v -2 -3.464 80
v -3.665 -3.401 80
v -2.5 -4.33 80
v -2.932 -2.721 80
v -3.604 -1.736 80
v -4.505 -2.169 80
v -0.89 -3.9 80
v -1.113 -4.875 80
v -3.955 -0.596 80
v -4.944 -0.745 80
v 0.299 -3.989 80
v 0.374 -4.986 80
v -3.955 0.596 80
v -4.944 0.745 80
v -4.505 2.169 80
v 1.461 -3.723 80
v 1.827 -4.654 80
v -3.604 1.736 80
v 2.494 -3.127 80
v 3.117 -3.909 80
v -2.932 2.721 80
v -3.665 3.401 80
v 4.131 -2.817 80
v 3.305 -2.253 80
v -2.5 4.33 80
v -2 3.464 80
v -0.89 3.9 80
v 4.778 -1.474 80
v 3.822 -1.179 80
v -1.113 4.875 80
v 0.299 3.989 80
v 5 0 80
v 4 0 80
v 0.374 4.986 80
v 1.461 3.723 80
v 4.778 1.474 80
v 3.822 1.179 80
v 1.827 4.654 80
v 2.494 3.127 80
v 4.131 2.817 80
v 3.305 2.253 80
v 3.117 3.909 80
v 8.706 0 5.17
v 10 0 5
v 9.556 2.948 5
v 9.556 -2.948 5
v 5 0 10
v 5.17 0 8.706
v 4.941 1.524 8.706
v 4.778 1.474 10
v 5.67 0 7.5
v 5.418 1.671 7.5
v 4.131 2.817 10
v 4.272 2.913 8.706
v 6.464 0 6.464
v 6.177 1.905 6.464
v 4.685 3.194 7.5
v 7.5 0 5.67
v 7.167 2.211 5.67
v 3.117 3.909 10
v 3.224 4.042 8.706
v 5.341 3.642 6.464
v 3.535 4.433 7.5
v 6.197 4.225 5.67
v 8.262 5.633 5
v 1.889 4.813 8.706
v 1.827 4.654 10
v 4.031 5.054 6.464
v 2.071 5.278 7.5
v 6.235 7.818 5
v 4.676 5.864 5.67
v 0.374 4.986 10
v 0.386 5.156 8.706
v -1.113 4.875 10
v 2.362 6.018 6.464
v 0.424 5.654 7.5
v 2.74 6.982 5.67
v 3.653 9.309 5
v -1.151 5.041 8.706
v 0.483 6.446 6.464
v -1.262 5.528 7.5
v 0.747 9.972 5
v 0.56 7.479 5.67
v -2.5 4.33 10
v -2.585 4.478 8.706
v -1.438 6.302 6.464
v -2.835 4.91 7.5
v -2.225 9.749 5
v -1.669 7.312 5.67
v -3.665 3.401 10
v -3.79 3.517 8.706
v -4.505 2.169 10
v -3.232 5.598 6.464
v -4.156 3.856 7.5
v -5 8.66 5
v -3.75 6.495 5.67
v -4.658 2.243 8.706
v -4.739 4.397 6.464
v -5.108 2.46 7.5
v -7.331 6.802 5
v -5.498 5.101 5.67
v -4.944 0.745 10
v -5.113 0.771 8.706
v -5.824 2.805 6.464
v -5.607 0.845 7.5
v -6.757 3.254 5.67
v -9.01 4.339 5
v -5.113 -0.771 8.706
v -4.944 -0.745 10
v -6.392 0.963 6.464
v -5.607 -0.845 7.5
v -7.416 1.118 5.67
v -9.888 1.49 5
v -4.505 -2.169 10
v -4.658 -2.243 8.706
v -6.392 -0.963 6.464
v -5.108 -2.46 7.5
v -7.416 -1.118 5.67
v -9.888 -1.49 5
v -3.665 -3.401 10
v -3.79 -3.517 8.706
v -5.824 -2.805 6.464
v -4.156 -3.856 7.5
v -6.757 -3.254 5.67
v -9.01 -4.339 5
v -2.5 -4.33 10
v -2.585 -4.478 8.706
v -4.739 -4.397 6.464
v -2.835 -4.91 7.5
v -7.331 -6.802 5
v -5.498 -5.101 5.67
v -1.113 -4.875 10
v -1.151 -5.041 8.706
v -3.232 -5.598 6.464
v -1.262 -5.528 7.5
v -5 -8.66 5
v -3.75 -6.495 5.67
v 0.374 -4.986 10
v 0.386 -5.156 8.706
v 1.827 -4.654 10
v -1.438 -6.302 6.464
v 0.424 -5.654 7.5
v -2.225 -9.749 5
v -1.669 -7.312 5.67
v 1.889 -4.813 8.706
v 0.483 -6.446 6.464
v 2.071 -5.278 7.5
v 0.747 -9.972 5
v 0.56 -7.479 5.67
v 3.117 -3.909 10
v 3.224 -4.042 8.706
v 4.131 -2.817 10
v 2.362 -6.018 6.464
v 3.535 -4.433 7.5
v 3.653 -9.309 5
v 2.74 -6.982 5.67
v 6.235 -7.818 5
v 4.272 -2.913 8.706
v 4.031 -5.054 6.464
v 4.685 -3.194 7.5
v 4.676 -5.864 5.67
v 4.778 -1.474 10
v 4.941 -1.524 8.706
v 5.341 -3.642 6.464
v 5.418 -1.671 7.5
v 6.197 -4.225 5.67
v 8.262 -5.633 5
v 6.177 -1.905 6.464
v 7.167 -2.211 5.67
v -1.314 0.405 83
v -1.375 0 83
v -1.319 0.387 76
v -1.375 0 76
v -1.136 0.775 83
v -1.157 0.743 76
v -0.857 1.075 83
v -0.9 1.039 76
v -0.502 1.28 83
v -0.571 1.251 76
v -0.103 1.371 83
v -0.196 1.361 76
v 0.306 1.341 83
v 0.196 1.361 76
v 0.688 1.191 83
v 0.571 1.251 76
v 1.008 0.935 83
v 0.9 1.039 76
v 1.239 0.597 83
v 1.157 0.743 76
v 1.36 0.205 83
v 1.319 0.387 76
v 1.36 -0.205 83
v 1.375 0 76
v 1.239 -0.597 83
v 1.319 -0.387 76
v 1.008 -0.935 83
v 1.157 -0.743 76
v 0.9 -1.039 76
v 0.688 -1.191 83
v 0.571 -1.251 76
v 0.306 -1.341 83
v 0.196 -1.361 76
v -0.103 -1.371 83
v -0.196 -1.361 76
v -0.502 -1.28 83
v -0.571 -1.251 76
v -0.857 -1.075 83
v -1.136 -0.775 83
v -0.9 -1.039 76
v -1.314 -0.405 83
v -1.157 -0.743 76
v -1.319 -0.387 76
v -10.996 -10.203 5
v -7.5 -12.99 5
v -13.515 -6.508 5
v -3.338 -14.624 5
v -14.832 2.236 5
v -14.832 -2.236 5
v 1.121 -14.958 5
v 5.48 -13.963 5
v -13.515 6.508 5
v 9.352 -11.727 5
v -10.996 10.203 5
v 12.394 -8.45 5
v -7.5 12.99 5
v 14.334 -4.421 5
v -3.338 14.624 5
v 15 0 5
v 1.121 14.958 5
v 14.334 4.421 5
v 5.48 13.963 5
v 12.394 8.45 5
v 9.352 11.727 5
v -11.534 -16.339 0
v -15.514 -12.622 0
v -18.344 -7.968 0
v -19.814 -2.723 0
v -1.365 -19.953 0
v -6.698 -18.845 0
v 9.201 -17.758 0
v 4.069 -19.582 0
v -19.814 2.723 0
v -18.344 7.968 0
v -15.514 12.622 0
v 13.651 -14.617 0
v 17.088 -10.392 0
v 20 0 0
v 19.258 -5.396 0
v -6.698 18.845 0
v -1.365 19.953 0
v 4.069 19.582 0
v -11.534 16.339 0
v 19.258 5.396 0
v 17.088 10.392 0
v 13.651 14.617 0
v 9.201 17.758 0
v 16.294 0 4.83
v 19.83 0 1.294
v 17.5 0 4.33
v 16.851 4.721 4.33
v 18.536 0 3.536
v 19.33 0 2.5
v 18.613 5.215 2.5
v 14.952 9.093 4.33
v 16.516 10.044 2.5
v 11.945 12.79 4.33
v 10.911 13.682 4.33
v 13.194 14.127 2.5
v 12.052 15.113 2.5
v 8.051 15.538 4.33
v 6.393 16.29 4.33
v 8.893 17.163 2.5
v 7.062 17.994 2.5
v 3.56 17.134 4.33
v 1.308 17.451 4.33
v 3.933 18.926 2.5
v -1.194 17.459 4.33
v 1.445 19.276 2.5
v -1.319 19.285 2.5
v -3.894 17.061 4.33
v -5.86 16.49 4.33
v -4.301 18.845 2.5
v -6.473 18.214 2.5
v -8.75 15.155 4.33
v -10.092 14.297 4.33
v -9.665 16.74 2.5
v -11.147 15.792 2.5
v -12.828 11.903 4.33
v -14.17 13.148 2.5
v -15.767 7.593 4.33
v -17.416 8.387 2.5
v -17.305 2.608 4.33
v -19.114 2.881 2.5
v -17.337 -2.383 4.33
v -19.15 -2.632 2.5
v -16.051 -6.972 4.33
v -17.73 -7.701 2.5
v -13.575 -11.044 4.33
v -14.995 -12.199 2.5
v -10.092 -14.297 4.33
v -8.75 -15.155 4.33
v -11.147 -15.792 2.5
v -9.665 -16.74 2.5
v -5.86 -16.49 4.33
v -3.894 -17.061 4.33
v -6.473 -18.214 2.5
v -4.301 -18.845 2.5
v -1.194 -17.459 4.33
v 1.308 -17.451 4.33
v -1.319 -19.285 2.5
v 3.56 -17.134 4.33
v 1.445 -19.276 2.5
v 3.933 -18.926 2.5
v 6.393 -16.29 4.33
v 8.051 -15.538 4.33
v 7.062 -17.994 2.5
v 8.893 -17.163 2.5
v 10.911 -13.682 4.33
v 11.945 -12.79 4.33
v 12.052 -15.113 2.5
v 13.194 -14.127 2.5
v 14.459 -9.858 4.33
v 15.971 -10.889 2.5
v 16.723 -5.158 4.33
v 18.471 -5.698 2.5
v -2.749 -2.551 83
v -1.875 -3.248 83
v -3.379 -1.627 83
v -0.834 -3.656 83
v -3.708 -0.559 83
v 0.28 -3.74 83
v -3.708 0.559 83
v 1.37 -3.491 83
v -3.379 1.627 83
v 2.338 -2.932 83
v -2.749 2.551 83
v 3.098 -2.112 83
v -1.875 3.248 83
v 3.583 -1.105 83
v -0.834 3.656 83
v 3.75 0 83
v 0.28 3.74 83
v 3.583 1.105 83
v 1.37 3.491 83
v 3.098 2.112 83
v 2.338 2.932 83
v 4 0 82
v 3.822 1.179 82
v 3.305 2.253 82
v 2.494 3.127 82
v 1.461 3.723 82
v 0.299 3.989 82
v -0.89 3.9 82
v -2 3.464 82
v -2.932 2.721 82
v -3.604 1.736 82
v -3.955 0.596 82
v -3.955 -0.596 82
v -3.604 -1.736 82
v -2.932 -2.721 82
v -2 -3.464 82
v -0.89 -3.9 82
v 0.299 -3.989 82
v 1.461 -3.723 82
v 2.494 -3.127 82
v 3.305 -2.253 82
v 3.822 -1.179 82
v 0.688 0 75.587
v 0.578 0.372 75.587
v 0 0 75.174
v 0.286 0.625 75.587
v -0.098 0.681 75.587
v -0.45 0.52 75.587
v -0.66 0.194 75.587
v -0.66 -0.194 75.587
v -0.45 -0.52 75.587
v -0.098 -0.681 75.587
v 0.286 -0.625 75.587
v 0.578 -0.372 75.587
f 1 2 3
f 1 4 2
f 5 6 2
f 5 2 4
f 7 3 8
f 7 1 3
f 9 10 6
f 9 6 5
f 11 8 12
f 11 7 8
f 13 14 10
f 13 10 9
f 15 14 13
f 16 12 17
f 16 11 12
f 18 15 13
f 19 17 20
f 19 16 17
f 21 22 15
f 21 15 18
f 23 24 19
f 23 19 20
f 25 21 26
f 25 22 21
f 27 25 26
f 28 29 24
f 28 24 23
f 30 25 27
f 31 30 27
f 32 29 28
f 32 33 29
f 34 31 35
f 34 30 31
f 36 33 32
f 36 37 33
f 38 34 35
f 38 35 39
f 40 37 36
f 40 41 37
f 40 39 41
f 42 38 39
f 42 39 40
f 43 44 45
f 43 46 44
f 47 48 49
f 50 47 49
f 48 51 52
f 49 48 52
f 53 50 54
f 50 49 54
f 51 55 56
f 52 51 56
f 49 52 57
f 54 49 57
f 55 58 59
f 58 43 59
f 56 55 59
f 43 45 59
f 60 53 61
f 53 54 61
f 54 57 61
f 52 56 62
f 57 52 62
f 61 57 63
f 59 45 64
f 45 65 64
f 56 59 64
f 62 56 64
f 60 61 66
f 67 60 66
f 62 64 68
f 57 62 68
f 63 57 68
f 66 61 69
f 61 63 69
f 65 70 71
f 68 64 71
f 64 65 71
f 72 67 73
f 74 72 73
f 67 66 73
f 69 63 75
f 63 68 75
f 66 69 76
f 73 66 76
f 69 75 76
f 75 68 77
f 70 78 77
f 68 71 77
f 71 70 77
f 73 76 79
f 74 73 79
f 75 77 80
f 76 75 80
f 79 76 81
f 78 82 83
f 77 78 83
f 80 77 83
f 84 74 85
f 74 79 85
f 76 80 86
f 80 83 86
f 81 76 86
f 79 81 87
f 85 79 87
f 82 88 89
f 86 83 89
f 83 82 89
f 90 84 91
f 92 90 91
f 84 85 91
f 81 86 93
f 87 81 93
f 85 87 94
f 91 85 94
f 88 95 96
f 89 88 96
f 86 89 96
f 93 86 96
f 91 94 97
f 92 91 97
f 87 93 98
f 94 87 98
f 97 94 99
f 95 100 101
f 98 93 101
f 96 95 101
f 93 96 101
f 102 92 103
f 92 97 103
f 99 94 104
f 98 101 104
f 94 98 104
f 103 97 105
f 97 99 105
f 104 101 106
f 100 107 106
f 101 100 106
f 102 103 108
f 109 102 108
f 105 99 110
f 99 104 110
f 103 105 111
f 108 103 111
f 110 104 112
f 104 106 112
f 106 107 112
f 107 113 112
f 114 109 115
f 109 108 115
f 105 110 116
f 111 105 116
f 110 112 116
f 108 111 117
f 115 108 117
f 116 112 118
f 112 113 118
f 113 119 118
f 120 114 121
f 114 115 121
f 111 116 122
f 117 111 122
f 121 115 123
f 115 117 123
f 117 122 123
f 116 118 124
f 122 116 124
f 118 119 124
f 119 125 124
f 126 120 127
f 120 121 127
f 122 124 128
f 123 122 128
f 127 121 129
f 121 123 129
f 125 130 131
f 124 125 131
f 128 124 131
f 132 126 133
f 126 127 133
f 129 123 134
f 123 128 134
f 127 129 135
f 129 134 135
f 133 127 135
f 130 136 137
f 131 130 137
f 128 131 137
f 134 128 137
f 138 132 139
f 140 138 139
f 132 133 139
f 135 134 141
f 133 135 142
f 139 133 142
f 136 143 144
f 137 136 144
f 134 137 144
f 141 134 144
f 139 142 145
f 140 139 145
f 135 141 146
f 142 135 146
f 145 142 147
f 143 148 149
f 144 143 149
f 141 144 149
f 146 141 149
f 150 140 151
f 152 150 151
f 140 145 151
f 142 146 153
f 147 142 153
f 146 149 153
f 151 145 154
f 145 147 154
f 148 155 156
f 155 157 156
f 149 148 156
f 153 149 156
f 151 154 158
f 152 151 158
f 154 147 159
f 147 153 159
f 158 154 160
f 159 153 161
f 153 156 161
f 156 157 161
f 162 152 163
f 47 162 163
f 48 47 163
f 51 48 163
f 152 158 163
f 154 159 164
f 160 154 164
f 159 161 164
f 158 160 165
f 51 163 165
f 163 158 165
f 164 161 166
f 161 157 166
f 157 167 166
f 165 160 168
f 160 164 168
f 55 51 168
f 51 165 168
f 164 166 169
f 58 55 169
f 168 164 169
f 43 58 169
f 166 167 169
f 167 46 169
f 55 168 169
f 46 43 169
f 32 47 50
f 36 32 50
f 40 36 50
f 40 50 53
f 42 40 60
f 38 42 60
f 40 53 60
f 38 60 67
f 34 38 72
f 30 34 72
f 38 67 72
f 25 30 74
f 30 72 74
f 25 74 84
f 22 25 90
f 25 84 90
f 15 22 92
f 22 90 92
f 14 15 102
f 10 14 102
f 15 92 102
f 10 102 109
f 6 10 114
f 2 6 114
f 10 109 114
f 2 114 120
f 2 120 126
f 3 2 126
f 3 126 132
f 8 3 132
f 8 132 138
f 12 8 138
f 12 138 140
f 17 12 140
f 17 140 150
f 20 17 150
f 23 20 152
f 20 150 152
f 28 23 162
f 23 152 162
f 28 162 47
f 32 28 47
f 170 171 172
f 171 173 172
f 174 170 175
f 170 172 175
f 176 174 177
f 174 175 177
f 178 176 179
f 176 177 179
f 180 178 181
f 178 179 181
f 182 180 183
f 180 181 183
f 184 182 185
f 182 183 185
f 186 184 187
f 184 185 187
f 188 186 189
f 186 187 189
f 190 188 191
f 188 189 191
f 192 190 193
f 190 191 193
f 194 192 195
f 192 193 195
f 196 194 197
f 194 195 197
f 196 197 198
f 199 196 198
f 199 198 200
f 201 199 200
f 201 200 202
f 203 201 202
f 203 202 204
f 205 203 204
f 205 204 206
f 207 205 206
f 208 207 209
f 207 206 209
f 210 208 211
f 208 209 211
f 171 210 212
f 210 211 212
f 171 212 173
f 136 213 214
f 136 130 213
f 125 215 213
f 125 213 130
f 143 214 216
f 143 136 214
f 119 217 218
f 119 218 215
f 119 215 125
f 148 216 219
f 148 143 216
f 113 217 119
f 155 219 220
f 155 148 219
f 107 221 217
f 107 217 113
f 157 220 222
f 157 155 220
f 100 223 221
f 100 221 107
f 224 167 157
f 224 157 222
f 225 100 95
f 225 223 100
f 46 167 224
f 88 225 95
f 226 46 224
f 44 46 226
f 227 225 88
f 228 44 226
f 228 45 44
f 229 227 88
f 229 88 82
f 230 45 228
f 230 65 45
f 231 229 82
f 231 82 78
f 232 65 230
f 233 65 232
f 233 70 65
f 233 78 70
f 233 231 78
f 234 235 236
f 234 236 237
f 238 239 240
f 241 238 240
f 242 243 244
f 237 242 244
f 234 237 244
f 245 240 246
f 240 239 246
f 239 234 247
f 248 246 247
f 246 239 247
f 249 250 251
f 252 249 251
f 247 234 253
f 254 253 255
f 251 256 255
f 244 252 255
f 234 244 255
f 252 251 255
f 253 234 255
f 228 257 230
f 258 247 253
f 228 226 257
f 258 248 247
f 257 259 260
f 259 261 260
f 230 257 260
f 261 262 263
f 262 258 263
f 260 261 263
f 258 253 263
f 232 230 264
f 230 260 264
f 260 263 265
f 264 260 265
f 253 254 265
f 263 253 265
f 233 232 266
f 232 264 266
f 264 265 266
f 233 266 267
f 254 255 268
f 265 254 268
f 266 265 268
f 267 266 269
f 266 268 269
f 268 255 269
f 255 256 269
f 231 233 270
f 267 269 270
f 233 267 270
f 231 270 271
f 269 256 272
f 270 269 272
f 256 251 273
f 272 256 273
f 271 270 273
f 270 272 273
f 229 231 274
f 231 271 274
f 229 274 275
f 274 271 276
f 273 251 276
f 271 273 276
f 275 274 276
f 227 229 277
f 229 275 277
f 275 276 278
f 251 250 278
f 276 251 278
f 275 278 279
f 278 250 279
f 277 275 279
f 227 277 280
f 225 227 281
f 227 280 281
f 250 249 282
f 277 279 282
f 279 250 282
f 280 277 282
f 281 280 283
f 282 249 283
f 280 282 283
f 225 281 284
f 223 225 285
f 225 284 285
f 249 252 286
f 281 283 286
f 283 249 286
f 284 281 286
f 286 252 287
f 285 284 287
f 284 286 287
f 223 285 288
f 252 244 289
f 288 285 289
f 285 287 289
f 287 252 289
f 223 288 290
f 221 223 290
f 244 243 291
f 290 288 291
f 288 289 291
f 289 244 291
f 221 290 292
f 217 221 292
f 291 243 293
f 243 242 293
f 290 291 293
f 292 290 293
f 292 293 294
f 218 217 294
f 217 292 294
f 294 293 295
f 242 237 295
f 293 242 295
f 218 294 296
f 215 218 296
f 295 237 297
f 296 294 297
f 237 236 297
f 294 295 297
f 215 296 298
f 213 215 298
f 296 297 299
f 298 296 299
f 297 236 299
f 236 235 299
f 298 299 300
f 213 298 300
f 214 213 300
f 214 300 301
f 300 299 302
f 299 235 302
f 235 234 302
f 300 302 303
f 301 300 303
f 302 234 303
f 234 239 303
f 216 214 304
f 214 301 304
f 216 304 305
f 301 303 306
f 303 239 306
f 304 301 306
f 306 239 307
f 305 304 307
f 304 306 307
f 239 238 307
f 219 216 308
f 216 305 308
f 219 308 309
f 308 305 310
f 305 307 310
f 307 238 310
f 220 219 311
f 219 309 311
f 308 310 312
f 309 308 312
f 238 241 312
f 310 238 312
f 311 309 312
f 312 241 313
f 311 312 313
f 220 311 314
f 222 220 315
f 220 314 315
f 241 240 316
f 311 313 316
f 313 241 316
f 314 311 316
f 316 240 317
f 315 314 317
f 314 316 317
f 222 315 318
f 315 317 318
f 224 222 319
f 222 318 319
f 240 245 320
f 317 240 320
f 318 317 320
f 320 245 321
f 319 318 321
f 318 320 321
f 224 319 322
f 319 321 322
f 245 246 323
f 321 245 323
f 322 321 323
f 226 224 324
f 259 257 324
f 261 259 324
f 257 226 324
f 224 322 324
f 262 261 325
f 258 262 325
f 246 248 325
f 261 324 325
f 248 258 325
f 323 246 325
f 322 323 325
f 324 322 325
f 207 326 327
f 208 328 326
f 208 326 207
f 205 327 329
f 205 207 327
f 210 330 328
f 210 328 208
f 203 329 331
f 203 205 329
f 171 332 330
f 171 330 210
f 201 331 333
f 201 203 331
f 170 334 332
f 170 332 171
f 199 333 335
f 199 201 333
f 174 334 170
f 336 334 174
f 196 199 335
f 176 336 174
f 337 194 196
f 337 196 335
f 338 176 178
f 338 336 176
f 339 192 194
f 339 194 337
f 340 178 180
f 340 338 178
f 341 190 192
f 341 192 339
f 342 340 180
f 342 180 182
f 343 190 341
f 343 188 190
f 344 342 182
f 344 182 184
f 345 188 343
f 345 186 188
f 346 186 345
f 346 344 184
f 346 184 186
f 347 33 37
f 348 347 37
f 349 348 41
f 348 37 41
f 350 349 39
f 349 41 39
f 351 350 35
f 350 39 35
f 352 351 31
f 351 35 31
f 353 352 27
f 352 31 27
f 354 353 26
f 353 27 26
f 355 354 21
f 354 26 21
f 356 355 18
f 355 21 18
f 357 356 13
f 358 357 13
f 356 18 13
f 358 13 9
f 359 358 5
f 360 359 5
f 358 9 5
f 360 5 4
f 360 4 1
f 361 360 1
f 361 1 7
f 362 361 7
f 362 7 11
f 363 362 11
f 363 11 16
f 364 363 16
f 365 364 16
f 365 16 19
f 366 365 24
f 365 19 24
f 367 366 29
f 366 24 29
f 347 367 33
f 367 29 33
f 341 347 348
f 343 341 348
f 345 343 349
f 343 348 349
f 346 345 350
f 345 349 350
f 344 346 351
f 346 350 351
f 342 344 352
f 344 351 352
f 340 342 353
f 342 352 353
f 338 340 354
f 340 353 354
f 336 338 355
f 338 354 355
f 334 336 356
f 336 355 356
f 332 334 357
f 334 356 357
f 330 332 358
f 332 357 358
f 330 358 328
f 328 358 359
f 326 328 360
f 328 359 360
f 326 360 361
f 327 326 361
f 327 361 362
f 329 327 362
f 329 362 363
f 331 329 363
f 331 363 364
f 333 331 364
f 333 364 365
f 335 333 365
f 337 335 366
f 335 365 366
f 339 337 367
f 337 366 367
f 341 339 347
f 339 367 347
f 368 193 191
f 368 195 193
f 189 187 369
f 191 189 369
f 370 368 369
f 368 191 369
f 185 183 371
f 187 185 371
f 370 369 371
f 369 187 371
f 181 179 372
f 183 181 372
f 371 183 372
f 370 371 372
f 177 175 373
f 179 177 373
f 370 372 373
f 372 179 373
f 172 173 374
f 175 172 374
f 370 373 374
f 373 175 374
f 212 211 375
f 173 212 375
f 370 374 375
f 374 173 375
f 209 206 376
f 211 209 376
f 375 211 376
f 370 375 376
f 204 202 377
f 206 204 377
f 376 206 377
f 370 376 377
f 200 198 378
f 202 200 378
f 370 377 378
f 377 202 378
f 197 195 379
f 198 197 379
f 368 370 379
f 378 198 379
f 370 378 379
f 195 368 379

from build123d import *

# Parameters (mm, degrees)
F0_R     = 20
F1_DEPTH = 5
F2_R     = 5
F3_DEPTH = 75
F4_R     = 4
F5_DEPTH = 3
F6_SIZE2 = 1
F6_SIZE  = 0.25
F7_R     = 4.99999
F9_D     = 2.75
F9_DEPTH = 7
F9_TIP   = 0.8261833512


# Not quite as in the source:
# - a fillet or chamfer is up to 0.001 mm smaller than in the source, because OpenCascade refuses the exact size


with BuildPart() as f1:
    # F0 (on Top) → F1 (new body)
    with BuildSketch(Plane.XY):
        Circle(F0_R)
    extrude(amount=F1_DEPTH)

    # F2 (on face) → F3 (join)
    with BuildSketch(Plane.XY.offset(5)):
        Circle(F2_R)
    extrude(amount=F3_DEPTH)

    # F4 (on face) → F5 (join)
    with BuildSketch(Plane.XY.offset(80)):
        Circle(F4_R)
    extrude(amount=F5_DEPTH)

    # F6
    f6_edges = [f1.edges().sort_by_distance(p)[0] for p in [
        (-4, 0, 83),
    ]]
    f6_side = f1.faces().sort_by_distance((0, 0, 83))[0]
    chamfer(f6_edges, length=F6_SIZE, length2=F6_SIZE2, reference=f6_side)

    # F7 (radius 5 in the source; OpenCascade refuses exactly that, so slightly less here)
    f7_edges = [f1.edges().sort_by_distance(p)[0] for p in [
        (-20, 0, 5),
        (-5, 0, 5),
    ]]
    fillet(f7_edges, radius=F7_R)

    # F9
    with Locations(Plane.XY.offset(83)):
        with Locations((0, 0)):
            Hole(F9_D / 2, depth=F9_DEPTH)
            with Locations((0, 0, -(F9_DEPTH + F9_TIP / 2))):  # 118° drill point
                Cone(0, F9_D / 2, F9_TIP, mode=Mode.SUBTRACT)


solid = f1.part
